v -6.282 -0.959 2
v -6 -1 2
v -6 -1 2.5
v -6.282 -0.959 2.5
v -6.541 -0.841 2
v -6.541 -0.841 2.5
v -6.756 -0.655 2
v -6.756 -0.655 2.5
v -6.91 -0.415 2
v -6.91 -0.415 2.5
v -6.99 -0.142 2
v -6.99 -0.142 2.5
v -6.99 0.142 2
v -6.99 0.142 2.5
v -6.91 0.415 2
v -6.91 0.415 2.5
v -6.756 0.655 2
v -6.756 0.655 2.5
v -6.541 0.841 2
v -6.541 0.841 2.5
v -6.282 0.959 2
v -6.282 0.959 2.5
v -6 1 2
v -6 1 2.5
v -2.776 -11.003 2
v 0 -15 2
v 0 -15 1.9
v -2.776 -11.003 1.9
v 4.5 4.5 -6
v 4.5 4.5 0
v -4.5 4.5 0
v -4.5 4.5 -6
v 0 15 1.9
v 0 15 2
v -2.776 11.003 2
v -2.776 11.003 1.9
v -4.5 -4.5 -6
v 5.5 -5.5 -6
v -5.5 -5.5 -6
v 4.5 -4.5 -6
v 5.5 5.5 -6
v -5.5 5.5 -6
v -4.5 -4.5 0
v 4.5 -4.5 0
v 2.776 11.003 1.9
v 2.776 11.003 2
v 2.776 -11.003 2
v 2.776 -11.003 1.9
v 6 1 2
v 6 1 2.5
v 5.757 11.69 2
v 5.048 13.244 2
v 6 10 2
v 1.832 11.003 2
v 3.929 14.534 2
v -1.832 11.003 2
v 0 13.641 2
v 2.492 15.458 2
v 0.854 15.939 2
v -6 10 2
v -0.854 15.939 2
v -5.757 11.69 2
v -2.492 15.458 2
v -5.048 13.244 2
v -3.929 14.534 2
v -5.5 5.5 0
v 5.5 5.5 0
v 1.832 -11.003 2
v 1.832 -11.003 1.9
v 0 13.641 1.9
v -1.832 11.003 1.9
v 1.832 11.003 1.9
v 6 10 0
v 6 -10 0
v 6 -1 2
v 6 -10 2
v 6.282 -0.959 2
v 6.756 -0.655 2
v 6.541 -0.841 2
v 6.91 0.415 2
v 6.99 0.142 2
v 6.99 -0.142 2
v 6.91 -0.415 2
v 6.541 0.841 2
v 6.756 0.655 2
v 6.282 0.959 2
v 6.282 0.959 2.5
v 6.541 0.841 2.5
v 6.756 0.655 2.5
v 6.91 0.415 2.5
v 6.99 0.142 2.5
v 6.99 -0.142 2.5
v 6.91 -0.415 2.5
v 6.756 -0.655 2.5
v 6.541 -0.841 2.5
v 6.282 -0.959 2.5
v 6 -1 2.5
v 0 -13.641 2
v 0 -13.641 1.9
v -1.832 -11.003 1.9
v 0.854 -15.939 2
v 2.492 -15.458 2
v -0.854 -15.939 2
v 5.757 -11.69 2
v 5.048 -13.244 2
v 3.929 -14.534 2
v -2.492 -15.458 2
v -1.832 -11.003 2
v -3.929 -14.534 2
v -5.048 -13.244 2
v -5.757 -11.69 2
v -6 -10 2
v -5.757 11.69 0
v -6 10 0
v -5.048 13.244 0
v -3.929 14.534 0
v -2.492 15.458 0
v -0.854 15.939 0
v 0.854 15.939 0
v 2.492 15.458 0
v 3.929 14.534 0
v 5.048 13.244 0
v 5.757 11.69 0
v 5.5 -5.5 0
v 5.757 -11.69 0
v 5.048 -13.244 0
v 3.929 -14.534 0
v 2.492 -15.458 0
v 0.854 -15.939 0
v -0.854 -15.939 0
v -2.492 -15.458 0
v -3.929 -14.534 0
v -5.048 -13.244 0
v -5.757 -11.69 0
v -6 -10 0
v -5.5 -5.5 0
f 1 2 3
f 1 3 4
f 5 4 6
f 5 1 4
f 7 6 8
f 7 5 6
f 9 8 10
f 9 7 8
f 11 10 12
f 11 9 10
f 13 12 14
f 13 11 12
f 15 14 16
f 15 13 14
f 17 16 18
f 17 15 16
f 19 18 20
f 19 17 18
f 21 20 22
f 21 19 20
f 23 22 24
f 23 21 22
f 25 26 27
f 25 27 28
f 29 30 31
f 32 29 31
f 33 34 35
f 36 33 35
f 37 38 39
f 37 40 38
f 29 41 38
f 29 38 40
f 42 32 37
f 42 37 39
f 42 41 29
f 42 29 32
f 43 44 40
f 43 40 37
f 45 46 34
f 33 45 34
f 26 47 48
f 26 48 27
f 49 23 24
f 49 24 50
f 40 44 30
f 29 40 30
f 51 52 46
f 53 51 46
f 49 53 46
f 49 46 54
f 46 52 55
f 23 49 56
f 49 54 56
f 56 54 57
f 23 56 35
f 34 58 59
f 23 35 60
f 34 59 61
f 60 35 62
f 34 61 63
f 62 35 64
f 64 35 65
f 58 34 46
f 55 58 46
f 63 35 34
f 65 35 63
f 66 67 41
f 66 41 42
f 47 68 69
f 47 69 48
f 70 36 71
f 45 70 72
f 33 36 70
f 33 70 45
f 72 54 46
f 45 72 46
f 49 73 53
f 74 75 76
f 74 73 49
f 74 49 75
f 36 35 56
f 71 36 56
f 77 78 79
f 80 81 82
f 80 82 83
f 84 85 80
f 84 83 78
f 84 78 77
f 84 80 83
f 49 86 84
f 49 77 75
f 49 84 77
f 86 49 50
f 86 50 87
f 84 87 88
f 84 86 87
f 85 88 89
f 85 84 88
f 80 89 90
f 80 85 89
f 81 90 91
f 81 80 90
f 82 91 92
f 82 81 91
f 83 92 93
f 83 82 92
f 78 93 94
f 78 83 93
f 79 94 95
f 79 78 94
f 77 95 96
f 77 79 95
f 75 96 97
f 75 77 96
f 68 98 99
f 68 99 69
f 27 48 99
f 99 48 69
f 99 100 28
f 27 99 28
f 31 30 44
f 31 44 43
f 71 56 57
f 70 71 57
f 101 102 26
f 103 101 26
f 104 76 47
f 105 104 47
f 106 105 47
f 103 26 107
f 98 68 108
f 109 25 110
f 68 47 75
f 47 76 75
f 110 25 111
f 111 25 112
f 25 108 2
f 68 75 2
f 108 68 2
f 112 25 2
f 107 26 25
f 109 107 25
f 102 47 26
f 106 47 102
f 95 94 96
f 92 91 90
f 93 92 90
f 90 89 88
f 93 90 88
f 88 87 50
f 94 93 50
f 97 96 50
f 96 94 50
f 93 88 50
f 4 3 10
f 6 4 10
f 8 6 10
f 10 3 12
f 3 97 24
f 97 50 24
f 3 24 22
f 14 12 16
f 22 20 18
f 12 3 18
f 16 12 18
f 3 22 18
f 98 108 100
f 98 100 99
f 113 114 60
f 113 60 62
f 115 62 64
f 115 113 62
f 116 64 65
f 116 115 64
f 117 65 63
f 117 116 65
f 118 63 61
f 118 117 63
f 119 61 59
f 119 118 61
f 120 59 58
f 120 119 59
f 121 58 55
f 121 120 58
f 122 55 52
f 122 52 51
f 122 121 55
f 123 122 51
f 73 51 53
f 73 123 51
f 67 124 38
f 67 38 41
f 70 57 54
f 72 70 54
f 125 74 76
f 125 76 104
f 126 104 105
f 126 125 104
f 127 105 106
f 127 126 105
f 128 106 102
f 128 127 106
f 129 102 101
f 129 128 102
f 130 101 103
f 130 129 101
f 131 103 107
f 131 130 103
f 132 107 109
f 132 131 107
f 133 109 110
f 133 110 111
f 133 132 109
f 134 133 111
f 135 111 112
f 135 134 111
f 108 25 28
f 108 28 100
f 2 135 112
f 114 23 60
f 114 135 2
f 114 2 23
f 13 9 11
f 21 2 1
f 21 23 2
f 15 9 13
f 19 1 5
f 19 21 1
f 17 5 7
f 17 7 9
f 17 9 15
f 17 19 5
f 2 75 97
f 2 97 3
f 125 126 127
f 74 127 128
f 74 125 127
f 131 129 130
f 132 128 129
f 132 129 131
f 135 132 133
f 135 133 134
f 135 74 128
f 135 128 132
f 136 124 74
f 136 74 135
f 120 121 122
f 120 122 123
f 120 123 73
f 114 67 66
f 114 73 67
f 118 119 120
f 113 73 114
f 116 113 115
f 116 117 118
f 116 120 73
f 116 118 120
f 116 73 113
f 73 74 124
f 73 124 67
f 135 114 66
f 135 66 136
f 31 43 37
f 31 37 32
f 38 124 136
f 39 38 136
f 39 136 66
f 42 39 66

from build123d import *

# Parameters (mm, degrees)
BOSS_EXTRUDE1_DEPTH = 2
BOSS_EXTRUDE2_DEPTH = 0.5
CUT_EXTRUDE1_DEPTH  = 0.1
SKETCH4_W           = 11
SKETCH4_H           = 11
SKETCH4_W_2         = 9
SKETCH4_H_2         = 9
EXTRUDE_THIN1_DEPTH = 6


with BuildPart() as part:
    # Sketch1 → Boss-Extrude1 (new body)
    with BuildSketch(Plane.XY):
        with BuildLine():
            Line((6, 10), (6, -10))
            ThreePointArc((6, -10), (0, -16), (-6, -10))
            Line((-6, -10), (-6, 10))
            ThreePointArc((-6, 10), (0, 16), (6, 10))
        make_face()
    extrude(amount=BOSS_EXTRUDE1_DEPTH)

    # Sketch2 → Boss-Extrude2 (add)
    with BuildSketch(Plane.XY.offset(2)):
        with BuildLine():
            Line((-6, 1), (6, 1))
            ThreePointArc((6, 1), (7, 0), (6, -1))
            Line((6, -1), (-6, -1))
            ThreePointArc((-6, -1), (-7, 0), (-6, 1))
        make_face()
    extrude(amount=BOSS_EXTRUDE2_DEPTH)

    # Sketch3 → Cut-Extrude1 (cut)
    with BuildSketch(Plane.XY.offset(2)):
        Polygon((0, 15), (-2.775609333, 11.00312256), (-1.83190216, 11.00312256), (0, 13.641061671), (1.83190216, 11.00312256), (2.775609333, 11.00312256), align=None)
        Polygon((-2.775609333, -11.00312256), (-1.83190216, -11.00312256), (0, -13.641061671), (1.83190216, -11.00312256), (2.775609333, -11.00312256), (0, -15), align=None)
    extrude(amount=-CUT_EXTRUDE1_DEPTH, mode=Mode.SUBTRACT)

    # Sketch4 → Extrude-Thin1 (add)
    with BuildSketch(Plane(origin=(0, 0, 0), x_dir=(-1, 0, 0), z_dir=(0, 0, -1))):
        Rectangle(SKETCH4_W, SKETCH4_H)
        Rectangle(SKETCH4_W_2, SKETCH4_H_2, mode=Mode.SUBTRACT)
    extrude(amount=EXTRUDE_THIN1_DEPTH)


solid = part.part
